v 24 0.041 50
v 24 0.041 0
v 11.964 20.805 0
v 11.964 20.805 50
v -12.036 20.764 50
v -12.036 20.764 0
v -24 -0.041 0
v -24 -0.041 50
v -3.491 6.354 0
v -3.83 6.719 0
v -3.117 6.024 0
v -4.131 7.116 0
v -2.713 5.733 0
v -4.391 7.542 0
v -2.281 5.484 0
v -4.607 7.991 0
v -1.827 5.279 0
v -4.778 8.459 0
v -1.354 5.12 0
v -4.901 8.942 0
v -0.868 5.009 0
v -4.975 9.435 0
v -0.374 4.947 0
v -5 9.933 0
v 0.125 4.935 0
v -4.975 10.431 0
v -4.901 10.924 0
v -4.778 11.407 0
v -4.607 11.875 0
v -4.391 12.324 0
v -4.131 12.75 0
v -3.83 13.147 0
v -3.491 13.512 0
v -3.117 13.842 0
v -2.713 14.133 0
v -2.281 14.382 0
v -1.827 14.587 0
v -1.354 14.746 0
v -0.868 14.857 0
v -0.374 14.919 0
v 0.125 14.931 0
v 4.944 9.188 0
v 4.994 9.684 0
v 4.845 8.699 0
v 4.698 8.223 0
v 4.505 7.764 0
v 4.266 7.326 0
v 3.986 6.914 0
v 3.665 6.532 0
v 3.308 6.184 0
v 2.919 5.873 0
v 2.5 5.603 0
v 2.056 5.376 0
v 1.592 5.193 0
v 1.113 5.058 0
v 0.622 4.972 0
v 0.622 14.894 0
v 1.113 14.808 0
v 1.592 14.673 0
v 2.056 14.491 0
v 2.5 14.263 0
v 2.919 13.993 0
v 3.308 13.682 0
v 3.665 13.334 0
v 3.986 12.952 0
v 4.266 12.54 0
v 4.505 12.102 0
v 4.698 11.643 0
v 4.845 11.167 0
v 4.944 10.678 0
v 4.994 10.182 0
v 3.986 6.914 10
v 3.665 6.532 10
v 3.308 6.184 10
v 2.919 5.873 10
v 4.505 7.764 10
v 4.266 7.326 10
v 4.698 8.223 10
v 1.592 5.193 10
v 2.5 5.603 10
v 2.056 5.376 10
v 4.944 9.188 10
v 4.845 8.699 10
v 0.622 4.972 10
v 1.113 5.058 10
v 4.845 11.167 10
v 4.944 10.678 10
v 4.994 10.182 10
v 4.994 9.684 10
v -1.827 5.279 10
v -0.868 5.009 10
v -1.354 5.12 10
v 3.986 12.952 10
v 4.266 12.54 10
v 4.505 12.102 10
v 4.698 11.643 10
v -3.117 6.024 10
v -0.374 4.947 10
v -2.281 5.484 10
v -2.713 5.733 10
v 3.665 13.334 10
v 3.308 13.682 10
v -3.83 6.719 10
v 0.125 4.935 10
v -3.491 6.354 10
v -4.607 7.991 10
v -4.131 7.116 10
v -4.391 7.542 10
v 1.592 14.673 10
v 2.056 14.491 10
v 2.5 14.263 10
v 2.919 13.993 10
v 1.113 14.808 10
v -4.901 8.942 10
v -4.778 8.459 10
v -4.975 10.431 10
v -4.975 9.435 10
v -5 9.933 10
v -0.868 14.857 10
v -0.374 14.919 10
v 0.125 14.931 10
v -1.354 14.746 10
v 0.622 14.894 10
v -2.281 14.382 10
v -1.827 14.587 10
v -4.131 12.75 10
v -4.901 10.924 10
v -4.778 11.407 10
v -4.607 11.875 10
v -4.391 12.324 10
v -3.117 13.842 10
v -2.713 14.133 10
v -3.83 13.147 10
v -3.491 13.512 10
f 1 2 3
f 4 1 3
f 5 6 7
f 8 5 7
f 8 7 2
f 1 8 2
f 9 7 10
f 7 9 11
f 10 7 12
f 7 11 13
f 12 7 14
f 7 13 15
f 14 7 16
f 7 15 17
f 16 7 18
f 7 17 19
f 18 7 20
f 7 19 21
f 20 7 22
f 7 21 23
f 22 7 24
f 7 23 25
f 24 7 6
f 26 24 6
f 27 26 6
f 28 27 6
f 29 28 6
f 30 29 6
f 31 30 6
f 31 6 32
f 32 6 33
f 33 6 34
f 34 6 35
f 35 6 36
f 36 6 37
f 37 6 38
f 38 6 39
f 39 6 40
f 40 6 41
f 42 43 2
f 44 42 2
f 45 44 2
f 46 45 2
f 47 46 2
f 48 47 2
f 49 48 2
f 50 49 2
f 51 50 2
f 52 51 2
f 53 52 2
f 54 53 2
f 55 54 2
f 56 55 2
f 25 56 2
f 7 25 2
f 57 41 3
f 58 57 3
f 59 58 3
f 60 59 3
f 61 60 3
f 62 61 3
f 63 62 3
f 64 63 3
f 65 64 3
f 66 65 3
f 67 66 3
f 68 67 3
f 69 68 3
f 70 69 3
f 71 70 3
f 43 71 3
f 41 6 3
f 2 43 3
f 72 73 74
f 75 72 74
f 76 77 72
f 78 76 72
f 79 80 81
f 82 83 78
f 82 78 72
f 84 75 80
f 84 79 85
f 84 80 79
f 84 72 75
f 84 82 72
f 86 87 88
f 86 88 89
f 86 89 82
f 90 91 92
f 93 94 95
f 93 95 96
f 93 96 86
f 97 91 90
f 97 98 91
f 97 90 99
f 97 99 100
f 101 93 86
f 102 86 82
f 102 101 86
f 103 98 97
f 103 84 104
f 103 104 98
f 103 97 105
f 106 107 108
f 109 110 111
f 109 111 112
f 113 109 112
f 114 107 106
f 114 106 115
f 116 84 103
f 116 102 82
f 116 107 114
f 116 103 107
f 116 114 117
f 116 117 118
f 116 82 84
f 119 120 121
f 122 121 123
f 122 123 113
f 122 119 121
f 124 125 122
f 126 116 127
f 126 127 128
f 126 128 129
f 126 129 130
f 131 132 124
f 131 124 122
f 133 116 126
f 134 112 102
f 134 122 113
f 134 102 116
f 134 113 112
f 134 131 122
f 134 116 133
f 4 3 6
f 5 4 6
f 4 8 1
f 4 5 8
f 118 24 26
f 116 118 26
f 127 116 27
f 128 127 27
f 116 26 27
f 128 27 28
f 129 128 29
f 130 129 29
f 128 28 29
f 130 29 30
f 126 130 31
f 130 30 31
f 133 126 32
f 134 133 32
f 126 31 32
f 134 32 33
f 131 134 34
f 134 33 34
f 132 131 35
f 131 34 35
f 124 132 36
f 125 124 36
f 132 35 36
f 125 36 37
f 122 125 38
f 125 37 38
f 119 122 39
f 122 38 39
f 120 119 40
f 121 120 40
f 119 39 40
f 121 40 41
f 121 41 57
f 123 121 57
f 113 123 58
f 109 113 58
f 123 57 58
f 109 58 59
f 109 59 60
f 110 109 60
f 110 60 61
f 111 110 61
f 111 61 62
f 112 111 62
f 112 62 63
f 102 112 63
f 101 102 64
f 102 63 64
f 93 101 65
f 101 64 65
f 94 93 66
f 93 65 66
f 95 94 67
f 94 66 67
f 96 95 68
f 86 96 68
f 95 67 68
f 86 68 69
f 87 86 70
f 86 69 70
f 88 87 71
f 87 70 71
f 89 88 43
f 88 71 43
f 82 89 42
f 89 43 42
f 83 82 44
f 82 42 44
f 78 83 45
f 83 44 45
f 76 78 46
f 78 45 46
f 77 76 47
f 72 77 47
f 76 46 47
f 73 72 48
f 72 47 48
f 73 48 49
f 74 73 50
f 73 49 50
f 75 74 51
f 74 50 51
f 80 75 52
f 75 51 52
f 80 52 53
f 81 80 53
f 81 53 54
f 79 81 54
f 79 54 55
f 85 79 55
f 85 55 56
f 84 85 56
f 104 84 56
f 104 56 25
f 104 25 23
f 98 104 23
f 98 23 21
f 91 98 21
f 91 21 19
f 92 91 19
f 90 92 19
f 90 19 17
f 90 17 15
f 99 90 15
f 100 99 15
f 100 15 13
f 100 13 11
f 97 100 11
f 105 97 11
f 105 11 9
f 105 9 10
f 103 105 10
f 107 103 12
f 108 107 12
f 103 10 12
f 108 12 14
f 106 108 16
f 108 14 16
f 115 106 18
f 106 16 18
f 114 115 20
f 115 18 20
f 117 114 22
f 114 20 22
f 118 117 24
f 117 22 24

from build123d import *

# Parameters (mm, degrees)
SALIENTE_EXTRUIR1_DEPTH = 50
CROQUIS3_R              = 5
CORTAR_EXTRUIR1_DEPTH   = 10


with BuildPart() as part:
    # Croquis2 → Saliente-Extruir1 (new body)
    with BuildSketch(Plane.XY):
        Polygon((-24, -0.041121621), (24, 0.041121621), (11.964387631, 20.805170501), (-12.035612369, 20.76404888), align=None)
    extrude(amount=SALIENTE_EXTRUIR1_DEPTH)

    # Croquis3 → Cortar-Extruir1 (cut)
    with BuildSketch(Plane(origin=(0, 0, 0), x_dir=(-1, 0, 0), z_dir=(0, 0, -1))):
        with Locations((0, 9.933048714)):
            Circle(CROQUIS3_R)
    extrude(amount=-CORTAR_EXTRUIR1_DEPTH, mode=Mode.SUBTRACT)


solid = part.part
